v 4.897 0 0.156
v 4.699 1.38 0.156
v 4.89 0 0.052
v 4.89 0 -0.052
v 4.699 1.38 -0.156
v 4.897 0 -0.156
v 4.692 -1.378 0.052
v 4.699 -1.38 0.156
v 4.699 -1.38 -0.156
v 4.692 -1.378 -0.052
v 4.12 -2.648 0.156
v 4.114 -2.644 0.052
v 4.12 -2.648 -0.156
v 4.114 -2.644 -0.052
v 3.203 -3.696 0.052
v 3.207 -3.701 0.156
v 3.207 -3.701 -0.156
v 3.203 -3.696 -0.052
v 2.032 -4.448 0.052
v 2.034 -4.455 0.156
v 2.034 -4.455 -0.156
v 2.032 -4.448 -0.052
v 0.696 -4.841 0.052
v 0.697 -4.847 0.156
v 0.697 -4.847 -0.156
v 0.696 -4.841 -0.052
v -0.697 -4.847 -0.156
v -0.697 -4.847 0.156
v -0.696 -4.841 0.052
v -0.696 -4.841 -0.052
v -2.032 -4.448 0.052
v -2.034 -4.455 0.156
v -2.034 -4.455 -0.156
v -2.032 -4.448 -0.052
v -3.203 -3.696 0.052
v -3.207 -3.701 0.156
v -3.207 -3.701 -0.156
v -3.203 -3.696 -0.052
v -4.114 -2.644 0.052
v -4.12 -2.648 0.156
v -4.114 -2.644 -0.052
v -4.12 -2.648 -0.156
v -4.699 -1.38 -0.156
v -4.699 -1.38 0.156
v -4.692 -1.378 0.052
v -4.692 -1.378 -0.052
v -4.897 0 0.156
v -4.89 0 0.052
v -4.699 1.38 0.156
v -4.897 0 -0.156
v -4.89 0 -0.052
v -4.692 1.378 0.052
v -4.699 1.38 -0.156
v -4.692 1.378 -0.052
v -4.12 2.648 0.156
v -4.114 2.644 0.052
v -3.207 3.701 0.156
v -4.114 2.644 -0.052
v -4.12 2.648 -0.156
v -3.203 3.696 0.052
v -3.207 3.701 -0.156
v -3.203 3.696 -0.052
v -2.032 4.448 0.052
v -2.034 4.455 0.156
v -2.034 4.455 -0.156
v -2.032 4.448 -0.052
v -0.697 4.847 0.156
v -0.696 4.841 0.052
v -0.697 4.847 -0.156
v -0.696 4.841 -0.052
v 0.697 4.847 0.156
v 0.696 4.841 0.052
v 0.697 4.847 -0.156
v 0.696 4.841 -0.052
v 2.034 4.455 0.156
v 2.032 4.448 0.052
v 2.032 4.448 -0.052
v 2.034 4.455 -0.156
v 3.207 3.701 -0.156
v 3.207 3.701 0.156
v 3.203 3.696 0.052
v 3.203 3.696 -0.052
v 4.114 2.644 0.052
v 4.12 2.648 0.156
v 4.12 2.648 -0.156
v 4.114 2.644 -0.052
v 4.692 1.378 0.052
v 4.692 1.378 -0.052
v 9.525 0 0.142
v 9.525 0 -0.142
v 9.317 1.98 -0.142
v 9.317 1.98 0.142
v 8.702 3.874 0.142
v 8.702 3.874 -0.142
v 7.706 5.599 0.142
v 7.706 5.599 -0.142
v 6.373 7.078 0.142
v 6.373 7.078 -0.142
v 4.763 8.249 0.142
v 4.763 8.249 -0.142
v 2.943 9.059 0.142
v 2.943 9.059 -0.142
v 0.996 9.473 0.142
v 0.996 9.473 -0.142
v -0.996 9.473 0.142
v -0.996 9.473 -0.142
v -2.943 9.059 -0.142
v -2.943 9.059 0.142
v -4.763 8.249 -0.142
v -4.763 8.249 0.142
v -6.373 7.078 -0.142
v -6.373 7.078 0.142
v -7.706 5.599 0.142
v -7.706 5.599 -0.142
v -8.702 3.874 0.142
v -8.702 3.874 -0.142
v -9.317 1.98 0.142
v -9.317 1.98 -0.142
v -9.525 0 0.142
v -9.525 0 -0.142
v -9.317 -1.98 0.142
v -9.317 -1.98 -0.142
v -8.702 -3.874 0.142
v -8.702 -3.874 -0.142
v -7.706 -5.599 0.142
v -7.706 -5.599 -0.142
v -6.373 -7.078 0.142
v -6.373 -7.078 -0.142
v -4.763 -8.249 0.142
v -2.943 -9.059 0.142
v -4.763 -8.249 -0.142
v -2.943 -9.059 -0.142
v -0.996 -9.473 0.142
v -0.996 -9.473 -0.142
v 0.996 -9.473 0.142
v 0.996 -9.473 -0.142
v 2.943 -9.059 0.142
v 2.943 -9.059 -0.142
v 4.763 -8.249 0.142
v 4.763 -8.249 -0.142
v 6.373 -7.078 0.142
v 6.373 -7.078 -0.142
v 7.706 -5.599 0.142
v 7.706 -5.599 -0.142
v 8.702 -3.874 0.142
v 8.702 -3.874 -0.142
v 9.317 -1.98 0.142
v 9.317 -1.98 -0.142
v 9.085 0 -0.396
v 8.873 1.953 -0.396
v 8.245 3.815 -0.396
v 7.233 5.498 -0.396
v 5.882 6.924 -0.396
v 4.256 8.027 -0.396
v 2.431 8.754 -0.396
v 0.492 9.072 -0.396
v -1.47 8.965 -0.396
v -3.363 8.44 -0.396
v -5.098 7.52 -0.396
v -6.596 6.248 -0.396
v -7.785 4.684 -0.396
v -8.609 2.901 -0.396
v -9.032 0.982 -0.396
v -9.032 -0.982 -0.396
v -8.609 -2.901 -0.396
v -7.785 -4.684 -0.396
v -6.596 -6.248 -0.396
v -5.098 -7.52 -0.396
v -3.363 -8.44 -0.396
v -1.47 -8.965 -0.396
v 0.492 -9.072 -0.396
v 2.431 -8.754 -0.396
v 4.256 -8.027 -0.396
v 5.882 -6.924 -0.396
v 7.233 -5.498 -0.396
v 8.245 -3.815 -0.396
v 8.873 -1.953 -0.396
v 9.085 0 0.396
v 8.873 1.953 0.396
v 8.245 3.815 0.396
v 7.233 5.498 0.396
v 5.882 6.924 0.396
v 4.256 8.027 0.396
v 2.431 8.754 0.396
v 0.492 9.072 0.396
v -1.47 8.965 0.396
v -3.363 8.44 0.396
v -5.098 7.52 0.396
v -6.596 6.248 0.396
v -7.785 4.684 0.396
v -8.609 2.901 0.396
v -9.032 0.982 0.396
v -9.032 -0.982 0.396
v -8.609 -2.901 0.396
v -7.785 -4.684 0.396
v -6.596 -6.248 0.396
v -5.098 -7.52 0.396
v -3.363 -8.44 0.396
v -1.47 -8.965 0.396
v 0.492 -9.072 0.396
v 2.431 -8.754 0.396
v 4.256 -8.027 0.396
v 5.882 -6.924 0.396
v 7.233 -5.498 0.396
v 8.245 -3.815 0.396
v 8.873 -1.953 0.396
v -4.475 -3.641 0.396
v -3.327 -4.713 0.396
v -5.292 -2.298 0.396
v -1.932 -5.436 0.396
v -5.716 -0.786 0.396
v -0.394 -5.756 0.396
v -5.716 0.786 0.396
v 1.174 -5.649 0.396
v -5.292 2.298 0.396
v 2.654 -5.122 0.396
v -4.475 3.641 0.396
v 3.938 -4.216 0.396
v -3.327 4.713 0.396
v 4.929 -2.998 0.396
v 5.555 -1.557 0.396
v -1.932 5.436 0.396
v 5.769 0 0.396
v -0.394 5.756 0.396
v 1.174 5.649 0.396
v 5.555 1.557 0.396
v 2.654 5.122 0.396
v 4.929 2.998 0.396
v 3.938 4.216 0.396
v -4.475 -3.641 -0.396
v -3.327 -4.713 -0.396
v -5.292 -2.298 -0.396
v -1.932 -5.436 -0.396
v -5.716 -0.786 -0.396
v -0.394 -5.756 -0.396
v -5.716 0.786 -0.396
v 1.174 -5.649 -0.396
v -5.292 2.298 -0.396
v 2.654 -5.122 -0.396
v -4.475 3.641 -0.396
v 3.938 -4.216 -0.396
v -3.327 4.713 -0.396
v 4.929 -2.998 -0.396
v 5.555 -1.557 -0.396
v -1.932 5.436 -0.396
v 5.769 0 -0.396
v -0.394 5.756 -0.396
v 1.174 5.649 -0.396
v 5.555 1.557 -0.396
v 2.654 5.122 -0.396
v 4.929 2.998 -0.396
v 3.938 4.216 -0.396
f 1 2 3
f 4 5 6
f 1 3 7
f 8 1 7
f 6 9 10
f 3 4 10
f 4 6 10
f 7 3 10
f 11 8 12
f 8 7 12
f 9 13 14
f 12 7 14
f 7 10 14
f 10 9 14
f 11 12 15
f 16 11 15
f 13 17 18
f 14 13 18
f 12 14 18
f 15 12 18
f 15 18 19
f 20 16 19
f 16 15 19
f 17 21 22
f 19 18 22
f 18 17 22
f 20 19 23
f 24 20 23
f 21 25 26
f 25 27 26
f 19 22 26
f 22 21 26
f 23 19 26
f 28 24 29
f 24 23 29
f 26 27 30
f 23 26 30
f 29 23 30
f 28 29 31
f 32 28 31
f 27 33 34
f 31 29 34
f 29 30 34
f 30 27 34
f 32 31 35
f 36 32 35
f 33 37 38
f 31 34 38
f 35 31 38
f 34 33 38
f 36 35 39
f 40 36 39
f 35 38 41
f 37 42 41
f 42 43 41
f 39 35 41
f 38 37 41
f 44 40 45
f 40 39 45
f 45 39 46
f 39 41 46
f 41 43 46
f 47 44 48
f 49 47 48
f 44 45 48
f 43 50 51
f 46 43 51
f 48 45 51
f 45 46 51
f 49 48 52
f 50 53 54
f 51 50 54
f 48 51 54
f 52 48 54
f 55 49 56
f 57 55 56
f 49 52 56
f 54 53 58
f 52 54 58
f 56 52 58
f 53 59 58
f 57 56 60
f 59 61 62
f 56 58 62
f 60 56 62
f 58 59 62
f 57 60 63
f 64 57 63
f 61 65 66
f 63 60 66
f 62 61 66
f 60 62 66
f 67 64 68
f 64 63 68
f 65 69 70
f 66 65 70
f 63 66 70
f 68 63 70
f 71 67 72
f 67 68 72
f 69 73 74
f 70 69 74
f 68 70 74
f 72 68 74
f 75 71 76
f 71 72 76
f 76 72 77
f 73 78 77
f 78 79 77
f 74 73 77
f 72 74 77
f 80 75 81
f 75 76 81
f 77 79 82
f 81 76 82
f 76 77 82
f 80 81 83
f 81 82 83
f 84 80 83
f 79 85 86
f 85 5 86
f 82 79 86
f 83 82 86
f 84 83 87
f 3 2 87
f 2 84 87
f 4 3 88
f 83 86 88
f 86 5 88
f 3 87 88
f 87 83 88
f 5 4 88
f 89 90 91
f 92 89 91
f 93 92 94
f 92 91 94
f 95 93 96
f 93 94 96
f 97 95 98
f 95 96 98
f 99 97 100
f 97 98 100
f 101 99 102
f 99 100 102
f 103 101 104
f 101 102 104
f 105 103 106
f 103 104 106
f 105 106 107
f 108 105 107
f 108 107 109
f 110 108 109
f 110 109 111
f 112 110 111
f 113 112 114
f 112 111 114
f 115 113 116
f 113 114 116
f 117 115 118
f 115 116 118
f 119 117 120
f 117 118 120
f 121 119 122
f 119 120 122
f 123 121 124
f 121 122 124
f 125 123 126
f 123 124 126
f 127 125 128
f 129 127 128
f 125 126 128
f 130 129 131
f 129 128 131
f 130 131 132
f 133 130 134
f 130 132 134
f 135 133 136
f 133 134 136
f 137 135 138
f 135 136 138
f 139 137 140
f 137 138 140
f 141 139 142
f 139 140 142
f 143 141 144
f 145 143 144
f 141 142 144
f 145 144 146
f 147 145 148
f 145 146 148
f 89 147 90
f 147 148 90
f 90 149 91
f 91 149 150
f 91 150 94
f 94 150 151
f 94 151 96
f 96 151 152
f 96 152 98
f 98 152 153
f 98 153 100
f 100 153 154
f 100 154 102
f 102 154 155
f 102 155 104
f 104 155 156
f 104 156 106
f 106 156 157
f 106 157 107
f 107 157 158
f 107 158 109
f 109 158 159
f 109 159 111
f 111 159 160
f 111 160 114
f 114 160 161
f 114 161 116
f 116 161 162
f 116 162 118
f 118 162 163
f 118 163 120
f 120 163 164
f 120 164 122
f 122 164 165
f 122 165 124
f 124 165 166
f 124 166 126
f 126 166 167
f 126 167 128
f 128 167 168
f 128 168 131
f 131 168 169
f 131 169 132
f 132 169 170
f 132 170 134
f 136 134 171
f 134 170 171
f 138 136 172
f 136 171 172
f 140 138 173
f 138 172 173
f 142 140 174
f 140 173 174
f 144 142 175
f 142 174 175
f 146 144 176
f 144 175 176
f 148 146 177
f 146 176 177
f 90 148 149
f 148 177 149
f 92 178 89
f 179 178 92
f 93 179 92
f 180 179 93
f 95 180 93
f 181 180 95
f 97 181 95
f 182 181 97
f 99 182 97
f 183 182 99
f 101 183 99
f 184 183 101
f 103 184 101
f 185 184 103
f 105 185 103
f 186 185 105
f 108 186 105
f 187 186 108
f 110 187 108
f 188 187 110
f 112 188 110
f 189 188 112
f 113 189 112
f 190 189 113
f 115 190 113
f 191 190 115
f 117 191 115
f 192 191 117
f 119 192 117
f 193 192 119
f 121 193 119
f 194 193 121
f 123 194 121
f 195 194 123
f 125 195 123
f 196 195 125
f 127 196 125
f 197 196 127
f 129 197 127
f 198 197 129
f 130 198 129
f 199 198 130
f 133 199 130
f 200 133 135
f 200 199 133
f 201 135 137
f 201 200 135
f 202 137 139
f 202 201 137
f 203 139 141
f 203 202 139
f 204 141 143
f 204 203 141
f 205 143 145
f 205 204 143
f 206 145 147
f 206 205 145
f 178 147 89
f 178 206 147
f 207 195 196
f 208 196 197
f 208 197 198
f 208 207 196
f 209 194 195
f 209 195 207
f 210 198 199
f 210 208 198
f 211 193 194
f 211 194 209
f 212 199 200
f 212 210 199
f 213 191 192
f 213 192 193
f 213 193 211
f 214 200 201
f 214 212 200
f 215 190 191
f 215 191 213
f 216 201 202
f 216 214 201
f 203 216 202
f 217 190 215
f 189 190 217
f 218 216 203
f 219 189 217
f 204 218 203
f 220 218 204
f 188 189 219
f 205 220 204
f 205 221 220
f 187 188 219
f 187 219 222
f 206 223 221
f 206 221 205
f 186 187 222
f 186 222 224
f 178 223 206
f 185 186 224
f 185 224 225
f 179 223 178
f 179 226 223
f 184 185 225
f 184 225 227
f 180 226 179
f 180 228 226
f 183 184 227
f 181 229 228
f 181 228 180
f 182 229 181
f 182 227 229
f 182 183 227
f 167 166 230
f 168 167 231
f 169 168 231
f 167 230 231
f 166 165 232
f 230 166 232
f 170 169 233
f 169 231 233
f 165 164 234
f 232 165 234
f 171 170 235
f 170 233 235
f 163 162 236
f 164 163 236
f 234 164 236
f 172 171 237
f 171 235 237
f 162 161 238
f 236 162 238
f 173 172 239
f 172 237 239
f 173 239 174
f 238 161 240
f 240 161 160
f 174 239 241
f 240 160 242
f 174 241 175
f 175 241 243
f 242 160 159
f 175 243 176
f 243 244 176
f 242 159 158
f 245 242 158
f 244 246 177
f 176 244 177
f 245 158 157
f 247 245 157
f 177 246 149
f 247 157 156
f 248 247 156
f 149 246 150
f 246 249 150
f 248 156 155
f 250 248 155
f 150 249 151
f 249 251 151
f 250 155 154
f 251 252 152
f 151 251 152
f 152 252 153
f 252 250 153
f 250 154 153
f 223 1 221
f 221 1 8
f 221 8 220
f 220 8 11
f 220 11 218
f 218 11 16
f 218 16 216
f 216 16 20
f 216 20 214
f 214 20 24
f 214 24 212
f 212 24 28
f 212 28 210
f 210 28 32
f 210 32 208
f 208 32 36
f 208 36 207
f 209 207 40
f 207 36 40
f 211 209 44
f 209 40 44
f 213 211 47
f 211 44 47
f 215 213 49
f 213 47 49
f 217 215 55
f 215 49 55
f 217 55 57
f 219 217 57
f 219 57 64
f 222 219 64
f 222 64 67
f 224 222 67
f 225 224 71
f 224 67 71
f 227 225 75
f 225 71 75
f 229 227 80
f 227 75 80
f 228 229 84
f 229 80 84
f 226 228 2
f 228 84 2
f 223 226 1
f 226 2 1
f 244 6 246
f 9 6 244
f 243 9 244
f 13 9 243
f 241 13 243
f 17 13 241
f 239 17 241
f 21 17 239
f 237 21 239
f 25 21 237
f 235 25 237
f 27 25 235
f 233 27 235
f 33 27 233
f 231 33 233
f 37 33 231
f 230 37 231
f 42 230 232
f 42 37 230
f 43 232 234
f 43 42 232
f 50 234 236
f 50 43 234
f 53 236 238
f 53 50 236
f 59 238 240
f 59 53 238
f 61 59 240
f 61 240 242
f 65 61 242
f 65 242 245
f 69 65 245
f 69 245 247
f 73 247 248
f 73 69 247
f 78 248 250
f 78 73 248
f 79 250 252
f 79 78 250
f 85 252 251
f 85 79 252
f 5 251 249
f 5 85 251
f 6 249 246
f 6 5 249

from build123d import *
from OCP.BRepFilletAPI import BRepFilletAPI_MakeChamfer

# Parameters (mm, degrees)
BOSS_EXTRUDE1_DEPTH      = 0.39624
BOSS_EXTRUDE1_DEPTH_BACK = 0.39624
SKETCH3_R                = 9.525
SKETCH3_R_2              = 4.8895
CHAMFER1_SIZE            = 0.254
CHAMFER1_SIZE2           = 0.439940905
CHAMFER2_SIZE            = 0.828943919


with BuildPart() as part:
    # Sketch3 → Boss-Extrude1 (new, two sides: drawn at the far end of the back side and taken through both)
    with BuildSketch(Plane.XY.offset(-BOSS_EXTRUDE1_DEPTH_BACK)):
        Circle(SKETCH3_R)
        Circle(SKETCH3_R_2, mode=Mode.SUBTRACT)
    extrude(amount=BOSS_EXTRUDE1_DEPTH + BOSS_EXTRUDE1_DEPTH_BACK)

    # Chamfer1: one chamfer whose edges measure the first distance from different faces: ONE call of the kernel's chamfer builder (chamfer() names one face for all edges)
    chamfer1_edges_1 = [part.edges().sort_by_distance(p)[0] for p in [
        (-9.525, 0, 0.39624),
    ]]
    chamfer1_side_1 = [part.faces().sort_by_distance(p)[0] for p in [
        (-9.525, 0, 0.19812),
    ]]
    chamfer1_edges_2 = [part.edges().sort_by_distance(p)[0] for p in [
        (-9.525, 0, -0.39624),
    ]]
    chamfer1_side_2 = [part.faces().sort_by_distance(p)[0] for p in [
        (-9.525, 0, -0.19812),
    ]]
    chamfer1 = BRepFilletAPI_MakeChamfer(part.part.solid().wrapped)
    for e in chamfer1_edges_1:
        chamfer1.Add(CHAMFER1_SIZE, CHAMFER1_SIZE2, e.wrapped, chamfer1_side_1[0].wrapped)  # the first distance lies on this face
    for e in chamfer1_edges_2:
        chamfer1.Add(CHAMFER1_SIZE, CHAMFER1_SIZE2, e.wrapped, chamfer1_side_2[0].wrapped)  # the first distance lies on this face
    add(Compound.cast(chamfer1.Shape()), mode=Mode.REPLACE)

    # Sketch4 → Cut-Revolve1 (revolve, cut)
    with BuildSketch(Plane(origin=(0, 0, 0), x_dir=(0, 0, -1), z_dir=(1, 0, 0)), mode=Mode.PRIVATE) as cut_revolve1_sk:
        with BuildLine():
            Line((-0.39624, 4.8387), (-0.39624, 4.9403))
            ThreePointArc((-0.39624, 4.9403), (0, 4.8895), (0.39624, 4.9403))
            Line((0.39624, 4.9403), (0.39624, 4.8387))
            Line((0.39624, 4.8387), (-0.39624, 4.8387))
        make_face()
    revolve(cut_revolve1_sk.sketch.rotate(Axis((0, 0, 0.39624), (0, 0, -1)), 90), axis=Axis((0, 0, 0.39624), (0, 0, -1)), mode=Mode.SUBTRACT)

    # Chamfer2
    # the kernel refuses this chamfer: 0.828943919, 0.254 mm, written as the material it takes off along each edge
    with BuildSketch(Plane(origin=(0, 0, -0.39624), x_dir=(1, 0, 0), z_dir=(0, 1, 0))) as chamfer2_piece_1:
        with BuildLine():
            Line((4.9403 + CHAMFER2_SIZE, 0), (4.897291135, -0.239987219))
            ThreePointArc((4.897291135, -0.239987219), (4.91289484, -0.126153132), (4.9403, 0))
            Line((4.9403, 0), (4.9403 + CHAMFER2_SIZE, 0))
        make_face()
    revolve(axis=Axis((0, 0, -0.39624), (0, 0, -1)), mode=Mode.SUBTRACT)
    with BuildSketch(Plane(origin=(0, 0, 0.39624), x_dir=(1, 0, 0), z_dir=(0, 1, 0))) as chamfer2_piece_2:
        with BuildLine():
            Line((4.9403 + CHAMFER2_SIZE, 0), (4.897291135, 0.239987219))
            ThreePointArc((4.897291135, 0.239987219), (4.91289484, 0.126153132), (4.9403, 0))
            Line((4.9403, 0), (4.9403 + CHAMFER2_SIZE, 0))
        make_face()
    revolve(axis=Axis((0, 0, 0.39624), (0, 0, -1)), mode=Mode.SUBTRACT)


solid = part.part
